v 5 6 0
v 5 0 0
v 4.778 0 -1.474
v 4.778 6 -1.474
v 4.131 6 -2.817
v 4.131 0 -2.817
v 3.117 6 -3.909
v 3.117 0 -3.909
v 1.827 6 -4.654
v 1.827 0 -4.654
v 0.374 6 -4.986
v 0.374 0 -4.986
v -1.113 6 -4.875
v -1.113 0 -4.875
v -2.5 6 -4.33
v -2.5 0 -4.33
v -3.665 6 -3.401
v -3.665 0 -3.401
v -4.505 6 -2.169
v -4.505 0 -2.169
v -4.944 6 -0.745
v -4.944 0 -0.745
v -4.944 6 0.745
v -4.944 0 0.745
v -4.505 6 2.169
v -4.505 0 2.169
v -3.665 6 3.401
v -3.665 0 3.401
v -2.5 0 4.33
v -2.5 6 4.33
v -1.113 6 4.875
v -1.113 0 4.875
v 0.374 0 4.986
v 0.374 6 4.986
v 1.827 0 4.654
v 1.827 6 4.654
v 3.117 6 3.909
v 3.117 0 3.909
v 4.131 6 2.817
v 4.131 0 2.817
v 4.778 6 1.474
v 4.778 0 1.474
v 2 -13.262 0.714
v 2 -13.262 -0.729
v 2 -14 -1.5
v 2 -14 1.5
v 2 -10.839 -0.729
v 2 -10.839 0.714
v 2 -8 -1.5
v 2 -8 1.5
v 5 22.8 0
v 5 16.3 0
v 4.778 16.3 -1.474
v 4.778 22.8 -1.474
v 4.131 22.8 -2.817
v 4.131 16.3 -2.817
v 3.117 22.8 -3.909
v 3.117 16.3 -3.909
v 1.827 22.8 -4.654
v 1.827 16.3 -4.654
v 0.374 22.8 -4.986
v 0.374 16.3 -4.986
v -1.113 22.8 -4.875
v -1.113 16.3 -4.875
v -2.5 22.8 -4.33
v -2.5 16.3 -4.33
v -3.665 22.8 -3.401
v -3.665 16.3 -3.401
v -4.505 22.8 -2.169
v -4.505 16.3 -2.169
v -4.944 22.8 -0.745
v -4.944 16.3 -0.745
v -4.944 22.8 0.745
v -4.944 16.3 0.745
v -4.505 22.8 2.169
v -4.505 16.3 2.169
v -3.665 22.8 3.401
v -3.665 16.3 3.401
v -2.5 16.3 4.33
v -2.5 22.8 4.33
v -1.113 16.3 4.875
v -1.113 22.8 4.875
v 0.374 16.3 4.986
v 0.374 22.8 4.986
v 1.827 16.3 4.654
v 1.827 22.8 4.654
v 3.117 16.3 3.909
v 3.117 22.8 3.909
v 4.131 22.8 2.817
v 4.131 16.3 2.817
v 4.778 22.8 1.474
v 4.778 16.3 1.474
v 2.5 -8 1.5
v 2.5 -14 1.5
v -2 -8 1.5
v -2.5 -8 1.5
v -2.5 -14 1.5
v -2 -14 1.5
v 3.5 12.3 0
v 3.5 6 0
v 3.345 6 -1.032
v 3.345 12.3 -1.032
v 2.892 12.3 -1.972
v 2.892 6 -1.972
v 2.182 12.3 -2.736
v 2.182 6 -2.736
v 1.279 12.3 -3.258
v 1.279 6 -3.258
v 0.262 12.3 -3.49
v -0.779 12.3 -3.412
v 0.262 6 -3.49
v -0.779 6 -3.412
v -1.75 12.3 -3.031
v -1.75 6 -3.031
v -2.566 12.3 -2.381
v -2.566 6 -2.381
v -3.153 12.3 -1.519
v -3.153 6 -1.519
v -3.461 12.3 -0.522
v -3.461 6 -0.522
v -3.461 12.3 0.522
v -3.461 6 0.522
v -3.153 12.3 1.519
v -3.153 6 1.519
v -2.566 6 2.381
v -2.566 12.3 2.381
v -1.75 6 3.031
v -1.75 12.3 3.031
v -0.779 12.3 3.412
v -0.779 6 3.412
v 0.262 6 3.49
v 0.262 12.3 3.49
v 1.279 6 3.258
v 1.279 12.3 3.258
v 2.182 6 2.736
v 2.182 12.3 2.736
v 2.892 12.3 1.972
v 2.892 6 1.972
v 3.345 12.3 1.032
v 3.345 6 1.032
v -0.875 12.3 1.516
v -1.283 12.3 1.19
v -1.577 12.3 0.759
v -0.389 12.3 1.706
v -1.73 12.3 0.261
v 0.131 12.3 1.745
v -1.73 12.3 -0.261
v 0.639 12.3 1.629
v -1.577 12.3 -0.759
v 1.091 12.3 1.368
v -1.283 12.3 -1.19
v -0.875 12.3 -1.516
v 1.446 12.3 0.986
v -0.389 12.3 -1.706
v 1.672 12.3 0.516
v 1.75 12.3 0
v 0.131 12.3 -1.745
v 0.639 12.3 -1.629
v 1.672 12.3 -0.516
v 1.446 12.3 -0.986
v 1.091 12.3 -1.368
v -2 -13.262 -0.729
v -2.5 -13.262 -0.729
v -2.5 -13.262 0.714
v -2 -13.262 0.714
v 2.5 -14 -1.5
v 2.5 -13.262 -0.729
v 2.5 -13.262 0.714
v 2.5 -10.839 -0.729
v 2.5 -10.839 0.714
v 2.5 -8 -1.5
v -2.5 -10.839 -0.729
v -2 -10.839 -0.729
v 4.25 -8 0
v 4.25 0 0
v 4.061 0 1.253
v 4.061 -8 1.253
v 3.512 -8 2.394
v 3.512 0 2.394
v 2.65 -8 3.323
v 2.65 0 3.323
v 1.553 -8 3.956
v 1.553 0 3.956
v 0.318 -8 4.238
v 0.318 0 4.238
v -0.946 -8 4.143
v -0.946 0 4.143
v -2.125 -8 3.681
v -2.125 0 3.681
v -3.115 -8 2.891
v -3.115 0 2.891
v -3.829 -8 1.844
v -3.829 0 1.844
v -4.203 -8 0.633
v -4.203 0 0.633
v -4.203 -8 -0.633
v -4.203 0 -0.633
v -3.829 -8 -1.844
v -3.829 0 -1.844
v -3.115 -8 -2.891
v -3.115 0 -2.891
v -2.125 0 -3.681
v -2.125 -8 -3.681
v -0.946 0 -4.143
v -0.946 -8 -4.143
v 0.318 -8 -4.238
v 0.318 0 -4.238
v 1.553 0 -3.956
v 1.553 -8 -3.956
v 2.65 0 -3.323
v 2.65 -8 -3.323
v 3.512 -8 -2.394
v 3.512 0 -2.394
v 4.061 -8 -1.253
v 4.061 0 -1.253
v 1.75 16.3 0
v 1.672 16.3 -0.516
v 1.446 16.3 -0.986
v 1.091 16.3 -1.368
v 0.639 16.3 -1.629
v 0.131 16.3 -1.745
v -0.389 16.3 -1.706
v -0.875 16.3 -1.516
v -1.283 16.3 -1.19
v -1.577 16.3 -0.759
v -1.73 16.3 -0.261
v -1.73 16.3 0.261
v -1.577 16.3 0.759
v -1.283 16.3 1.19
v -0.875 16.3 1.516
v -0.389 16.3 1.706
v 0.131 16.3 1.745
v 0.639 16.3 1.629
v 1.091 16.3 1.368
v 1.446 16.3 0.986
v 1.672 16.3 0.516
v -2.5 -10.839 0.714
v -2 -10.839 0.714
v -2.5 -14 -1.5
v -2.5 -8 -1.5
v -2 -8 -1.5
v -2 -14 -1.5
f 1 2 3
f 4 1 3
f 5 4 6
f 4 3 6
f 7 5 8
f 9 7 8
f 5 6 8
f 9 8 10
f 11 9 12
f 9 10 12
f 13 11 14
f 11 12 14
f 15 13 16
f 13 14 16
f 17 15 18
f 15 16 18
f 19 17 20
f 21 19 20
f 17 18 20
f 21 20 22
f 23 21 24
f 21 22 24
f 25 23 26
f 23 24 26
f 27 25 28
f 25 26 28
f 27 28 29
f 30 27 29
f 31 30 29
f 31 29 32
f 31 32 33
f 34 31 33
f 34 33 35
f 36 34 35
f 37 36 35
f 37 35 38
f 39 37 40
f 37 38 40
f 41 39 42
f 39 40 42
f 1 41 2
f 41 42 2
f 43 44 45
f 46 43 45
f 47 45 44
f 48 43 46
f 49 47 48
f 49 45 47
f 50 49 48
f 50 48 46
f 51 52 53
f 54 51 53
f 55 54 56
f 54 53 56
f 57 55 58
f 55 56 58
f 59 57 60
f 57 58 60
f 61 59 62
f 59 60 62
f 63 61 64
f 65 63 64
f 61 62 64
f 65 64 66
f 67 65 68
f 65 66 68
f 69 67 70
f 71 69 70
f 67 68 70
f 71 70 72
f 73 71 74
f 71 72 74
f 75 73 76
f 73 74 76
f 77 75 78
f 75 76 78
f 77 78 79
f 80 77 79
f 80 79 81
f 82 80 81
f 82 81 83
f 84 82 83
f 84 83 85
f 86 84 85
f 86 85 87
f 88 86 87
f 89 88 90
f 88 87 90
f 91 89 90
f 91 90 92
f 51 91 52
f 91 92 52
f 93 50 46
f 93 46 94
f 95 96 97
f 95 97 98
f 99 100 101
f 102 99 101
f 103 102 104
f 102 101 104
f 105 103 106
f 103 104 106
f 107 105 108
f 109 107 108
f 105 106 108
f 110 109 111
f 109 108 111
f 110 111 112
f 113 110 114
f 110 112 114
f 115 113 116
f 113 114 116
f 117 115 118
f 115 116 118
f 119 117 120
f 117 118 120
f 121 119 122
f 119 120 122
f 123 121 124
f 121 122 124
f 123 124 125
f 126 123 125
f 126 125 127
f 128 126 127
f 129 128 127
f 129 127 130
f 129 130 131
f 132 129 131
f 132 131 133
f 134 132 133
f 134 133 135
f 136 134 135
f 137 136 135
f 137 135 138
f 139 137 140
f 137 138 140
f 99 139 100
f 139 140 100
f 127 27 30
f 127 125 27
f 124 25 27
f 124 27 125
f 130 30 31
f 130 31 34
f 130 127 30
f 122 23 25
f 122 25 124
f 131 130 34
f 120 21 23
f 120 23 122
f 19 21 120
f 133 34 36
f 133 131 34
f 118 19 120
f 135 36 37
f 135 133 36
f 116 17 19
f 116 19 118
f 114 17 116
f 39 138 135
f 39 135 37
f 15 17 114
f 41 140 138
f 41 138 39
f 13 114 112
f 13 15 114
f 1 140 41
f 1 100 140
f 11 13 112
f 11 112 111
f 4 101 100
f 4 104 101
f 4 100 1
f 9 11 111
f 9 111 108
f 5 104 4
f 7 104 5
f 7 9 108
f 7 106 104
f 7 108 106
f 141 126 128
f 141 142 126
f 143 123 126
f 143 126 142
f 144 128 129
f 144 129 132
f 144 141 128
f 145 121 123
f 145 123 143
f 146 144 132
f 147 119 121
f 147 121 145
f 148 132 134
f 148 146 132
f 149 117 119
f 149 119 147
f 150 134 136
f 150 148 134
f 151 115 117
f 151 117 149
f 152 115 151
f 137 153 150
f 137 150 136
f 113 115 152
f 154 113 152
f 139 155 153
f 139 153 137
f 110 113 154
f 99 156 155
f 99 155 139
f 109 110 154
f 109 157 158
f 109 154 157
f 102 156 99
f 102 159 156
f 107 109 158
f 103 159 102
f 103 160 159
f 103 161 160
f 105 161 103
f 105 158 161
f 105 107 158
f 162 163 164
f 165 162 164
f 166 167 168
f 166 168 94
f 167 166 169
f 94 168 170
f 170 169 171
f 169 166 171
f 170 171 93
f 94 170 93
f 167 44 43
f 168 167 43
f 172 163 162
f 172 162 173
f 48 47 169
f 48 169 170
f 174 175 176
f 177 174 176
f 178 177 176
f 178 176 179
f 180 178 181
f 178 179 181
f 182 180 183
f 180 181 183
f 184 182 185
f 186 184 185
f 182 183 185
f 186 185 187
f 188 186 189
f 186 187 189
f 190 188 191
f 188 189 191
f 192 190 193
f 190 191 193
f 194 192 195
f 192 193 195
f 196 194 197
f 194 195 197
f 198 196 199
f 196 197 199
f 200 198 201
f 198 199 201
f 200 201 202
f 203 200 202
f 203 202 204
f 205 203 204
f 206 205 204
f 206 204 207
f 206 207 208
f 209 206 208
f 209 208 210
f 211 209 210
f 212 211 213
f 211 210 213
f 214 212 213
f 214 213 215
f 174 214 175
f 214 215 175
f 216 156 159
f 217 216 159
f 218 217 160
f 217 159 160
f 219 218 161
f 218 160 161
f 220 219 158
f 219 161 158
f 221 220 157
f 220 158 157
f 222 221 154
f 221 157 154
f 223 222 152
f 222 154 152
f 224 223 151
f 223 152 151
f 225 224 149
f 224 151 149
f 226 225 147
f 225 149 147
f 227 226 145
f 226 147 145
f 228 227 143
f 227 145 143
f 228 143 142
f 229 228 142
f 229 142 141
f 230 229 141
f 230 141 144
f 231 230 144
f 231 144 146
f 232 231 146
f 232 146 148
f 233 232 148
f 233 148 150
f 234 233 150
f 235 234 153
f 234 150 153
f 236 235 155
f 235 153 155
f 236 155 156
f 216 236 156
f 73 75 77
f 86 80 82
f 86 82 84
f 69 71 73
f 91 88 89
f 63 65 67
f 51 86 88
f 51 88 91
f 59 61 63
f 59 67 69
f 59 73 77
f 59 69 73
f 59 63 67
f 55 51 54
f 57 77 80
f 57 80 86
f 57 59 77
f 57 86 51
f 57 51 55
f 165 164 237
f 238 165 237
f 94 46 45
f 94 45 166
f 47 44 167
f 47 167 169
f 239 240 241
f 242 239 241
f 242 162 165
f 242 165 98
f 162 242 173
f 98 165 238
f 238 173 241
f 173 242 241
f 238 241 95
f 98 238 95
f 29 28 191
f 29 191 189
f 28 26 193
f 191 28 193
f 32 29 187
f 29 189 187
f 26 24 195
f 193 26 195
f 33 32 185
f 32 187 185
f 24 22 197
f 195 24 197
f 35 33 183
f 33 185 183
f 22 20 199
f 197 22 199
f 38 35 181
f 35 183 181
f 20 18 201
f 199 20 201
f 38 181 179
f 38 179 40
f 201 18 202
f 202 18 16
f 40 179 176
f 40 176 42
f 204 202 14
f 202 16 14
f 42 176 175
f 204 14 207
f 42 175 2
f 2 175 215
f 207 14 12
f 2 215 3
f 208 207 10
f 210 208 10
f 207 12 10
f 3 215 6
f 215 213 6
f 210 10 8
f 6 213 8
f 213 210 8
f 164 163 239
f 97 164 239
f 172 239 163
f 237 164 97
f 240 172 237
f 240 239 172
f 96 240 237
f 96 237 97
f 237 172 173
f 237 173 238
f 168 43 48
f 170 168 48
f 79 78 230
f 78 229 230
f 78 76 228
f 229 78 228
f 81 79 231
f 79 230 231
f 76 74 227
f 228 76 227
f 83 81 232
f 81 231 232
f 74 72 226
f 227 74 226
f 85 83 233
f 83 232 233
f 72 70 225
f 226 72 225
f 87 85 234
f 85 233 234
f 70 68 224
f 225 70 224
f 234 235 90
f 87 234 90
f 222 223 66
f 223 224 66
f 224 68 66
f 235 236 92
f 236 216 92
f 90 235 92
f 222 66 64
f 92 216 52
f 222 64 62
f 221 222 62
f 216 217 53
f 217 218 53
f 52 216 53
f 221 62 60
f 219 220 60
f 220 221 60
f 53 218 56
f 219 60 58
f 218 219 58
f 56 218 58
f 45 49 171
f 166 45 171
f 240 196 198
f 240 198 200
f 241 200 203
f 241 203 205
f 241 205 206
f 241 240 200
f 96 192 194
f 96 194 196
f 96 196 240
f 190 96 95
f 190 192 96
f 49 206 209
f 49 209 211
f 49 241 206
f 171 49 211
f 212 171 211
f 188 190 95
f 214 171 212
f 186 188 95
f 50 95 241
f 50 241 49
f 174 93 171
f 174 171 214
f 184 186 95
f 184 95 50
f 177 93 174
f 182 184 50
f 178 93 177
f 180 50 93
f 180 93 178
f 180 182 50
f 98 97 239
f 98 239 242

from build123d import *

# Parameters (mm, degrees)
ESBO_O1_R                = 5
RESSALTO_EXTRUS_O1_DEPTH = 6
ESBO_O2_R                = 4.25
RESSALTO_EXTRUS_O2_DEPTH = 8
ESBO_O3_W                = 0.5
ESBO_O3_H                = 3
RESSALTO_EXTRUS_O3_DEPTH = 6
ESBO_O4_W                = 1.442967266
ESBO_O4_H                = 2.423445024
CORTE_EXTRUS_O1_DEPTH    = 8.5
ESBO_O5_R                = 3.5
RESSALTO_EXTRUS_O4_DEPTH = 6.3
ESBO_O6_R                = 1.75
RESSALTO_EXTRUS_O5_DEPTH = 4
ESBO_O7_R                = 5
RESSALTO_EXTRUS_O6_DEPTH = 6.5


with BuildPart() as part:
    # Esboço1 → Ressalto-extrusão1 (new body)
    with BuildSketch(Plane(origin=(0, 0, 0), x_dir=(1, 0, 0), z_dir=(0, 1, 0))):
        Circle(ESBO_O1_R)
    extrude(amount=RESSALTO_EXTRUS_O1_DEPTH)

    # Esboço2 → Ressalto-extrusão2 (add)
    with BuildSketch(Plane.XZ):
        Circle(ESBO_O2_R)
    extrude(amount=RESSALTO_EXTRUS_O2_DEPTH)

    # Esboço3 → Ressalto-extrusão3 (add)
    with BuildSketch(Plane.XZ.offset(8)):
        with Locations((2.25, 0)):
            Rectangle(ESBO_O3_W, ESBO_O3_H)
        with Locations((-2.25, 0)):
            Rectangle(ESBO_O3_W, ESBO_O3_H)
    extrude(amount=RESSALTO_EXTRUS_O3_DEPTH)

    # Esboço4 → Corte-extrusão1 (cut, through all)
    with BuildSketch(Plane.ZY.offset(2.5)):
        with Locations((-0.007097641, -12.050464305)):
            Rectangle(ESBO_O4_W, ESBO_O4_H)
    extrude(amount=-CORTE_EXTRUS_O1_DEPTH, mode=Mode.SUBTRACT)

    # Esboço5 → Ressalto-extrusão4 (add)
    with BuildSketch(Plane(origin=(0, 6, 0), x_dir=(1, 0, 0), z_dir=(0, 1, 0))):
        Circle(ESBO_O5_R)
    extrude(amount=RESSALTO_EXTRUS_O4_DEPTH)

    # Esboço6 → Ressalto-extrusão5 (add)
    with BuildSketch(Plane(origin=(0, 12.3, 0), x_dir=(1, 0, 0), z_dir=(0, 1, 0))):
        Circle(ESBO_O6_R)
    extrude(amount=RESSALTO_EXTRUS_O5_DEPTH)

    # Esboço7 → Ressalto-extrusão6 (add)
    with BuildSketch(Plane(origin=(0, 16.3, 0), x_dir=(1, 0, 0), z_dir=(0, 1, 0))):
        Circle(ESBO_O7_R)
    extrude(amount=RESSALTO_EXTRUS_O6_DEPTH)


solid = part.part
